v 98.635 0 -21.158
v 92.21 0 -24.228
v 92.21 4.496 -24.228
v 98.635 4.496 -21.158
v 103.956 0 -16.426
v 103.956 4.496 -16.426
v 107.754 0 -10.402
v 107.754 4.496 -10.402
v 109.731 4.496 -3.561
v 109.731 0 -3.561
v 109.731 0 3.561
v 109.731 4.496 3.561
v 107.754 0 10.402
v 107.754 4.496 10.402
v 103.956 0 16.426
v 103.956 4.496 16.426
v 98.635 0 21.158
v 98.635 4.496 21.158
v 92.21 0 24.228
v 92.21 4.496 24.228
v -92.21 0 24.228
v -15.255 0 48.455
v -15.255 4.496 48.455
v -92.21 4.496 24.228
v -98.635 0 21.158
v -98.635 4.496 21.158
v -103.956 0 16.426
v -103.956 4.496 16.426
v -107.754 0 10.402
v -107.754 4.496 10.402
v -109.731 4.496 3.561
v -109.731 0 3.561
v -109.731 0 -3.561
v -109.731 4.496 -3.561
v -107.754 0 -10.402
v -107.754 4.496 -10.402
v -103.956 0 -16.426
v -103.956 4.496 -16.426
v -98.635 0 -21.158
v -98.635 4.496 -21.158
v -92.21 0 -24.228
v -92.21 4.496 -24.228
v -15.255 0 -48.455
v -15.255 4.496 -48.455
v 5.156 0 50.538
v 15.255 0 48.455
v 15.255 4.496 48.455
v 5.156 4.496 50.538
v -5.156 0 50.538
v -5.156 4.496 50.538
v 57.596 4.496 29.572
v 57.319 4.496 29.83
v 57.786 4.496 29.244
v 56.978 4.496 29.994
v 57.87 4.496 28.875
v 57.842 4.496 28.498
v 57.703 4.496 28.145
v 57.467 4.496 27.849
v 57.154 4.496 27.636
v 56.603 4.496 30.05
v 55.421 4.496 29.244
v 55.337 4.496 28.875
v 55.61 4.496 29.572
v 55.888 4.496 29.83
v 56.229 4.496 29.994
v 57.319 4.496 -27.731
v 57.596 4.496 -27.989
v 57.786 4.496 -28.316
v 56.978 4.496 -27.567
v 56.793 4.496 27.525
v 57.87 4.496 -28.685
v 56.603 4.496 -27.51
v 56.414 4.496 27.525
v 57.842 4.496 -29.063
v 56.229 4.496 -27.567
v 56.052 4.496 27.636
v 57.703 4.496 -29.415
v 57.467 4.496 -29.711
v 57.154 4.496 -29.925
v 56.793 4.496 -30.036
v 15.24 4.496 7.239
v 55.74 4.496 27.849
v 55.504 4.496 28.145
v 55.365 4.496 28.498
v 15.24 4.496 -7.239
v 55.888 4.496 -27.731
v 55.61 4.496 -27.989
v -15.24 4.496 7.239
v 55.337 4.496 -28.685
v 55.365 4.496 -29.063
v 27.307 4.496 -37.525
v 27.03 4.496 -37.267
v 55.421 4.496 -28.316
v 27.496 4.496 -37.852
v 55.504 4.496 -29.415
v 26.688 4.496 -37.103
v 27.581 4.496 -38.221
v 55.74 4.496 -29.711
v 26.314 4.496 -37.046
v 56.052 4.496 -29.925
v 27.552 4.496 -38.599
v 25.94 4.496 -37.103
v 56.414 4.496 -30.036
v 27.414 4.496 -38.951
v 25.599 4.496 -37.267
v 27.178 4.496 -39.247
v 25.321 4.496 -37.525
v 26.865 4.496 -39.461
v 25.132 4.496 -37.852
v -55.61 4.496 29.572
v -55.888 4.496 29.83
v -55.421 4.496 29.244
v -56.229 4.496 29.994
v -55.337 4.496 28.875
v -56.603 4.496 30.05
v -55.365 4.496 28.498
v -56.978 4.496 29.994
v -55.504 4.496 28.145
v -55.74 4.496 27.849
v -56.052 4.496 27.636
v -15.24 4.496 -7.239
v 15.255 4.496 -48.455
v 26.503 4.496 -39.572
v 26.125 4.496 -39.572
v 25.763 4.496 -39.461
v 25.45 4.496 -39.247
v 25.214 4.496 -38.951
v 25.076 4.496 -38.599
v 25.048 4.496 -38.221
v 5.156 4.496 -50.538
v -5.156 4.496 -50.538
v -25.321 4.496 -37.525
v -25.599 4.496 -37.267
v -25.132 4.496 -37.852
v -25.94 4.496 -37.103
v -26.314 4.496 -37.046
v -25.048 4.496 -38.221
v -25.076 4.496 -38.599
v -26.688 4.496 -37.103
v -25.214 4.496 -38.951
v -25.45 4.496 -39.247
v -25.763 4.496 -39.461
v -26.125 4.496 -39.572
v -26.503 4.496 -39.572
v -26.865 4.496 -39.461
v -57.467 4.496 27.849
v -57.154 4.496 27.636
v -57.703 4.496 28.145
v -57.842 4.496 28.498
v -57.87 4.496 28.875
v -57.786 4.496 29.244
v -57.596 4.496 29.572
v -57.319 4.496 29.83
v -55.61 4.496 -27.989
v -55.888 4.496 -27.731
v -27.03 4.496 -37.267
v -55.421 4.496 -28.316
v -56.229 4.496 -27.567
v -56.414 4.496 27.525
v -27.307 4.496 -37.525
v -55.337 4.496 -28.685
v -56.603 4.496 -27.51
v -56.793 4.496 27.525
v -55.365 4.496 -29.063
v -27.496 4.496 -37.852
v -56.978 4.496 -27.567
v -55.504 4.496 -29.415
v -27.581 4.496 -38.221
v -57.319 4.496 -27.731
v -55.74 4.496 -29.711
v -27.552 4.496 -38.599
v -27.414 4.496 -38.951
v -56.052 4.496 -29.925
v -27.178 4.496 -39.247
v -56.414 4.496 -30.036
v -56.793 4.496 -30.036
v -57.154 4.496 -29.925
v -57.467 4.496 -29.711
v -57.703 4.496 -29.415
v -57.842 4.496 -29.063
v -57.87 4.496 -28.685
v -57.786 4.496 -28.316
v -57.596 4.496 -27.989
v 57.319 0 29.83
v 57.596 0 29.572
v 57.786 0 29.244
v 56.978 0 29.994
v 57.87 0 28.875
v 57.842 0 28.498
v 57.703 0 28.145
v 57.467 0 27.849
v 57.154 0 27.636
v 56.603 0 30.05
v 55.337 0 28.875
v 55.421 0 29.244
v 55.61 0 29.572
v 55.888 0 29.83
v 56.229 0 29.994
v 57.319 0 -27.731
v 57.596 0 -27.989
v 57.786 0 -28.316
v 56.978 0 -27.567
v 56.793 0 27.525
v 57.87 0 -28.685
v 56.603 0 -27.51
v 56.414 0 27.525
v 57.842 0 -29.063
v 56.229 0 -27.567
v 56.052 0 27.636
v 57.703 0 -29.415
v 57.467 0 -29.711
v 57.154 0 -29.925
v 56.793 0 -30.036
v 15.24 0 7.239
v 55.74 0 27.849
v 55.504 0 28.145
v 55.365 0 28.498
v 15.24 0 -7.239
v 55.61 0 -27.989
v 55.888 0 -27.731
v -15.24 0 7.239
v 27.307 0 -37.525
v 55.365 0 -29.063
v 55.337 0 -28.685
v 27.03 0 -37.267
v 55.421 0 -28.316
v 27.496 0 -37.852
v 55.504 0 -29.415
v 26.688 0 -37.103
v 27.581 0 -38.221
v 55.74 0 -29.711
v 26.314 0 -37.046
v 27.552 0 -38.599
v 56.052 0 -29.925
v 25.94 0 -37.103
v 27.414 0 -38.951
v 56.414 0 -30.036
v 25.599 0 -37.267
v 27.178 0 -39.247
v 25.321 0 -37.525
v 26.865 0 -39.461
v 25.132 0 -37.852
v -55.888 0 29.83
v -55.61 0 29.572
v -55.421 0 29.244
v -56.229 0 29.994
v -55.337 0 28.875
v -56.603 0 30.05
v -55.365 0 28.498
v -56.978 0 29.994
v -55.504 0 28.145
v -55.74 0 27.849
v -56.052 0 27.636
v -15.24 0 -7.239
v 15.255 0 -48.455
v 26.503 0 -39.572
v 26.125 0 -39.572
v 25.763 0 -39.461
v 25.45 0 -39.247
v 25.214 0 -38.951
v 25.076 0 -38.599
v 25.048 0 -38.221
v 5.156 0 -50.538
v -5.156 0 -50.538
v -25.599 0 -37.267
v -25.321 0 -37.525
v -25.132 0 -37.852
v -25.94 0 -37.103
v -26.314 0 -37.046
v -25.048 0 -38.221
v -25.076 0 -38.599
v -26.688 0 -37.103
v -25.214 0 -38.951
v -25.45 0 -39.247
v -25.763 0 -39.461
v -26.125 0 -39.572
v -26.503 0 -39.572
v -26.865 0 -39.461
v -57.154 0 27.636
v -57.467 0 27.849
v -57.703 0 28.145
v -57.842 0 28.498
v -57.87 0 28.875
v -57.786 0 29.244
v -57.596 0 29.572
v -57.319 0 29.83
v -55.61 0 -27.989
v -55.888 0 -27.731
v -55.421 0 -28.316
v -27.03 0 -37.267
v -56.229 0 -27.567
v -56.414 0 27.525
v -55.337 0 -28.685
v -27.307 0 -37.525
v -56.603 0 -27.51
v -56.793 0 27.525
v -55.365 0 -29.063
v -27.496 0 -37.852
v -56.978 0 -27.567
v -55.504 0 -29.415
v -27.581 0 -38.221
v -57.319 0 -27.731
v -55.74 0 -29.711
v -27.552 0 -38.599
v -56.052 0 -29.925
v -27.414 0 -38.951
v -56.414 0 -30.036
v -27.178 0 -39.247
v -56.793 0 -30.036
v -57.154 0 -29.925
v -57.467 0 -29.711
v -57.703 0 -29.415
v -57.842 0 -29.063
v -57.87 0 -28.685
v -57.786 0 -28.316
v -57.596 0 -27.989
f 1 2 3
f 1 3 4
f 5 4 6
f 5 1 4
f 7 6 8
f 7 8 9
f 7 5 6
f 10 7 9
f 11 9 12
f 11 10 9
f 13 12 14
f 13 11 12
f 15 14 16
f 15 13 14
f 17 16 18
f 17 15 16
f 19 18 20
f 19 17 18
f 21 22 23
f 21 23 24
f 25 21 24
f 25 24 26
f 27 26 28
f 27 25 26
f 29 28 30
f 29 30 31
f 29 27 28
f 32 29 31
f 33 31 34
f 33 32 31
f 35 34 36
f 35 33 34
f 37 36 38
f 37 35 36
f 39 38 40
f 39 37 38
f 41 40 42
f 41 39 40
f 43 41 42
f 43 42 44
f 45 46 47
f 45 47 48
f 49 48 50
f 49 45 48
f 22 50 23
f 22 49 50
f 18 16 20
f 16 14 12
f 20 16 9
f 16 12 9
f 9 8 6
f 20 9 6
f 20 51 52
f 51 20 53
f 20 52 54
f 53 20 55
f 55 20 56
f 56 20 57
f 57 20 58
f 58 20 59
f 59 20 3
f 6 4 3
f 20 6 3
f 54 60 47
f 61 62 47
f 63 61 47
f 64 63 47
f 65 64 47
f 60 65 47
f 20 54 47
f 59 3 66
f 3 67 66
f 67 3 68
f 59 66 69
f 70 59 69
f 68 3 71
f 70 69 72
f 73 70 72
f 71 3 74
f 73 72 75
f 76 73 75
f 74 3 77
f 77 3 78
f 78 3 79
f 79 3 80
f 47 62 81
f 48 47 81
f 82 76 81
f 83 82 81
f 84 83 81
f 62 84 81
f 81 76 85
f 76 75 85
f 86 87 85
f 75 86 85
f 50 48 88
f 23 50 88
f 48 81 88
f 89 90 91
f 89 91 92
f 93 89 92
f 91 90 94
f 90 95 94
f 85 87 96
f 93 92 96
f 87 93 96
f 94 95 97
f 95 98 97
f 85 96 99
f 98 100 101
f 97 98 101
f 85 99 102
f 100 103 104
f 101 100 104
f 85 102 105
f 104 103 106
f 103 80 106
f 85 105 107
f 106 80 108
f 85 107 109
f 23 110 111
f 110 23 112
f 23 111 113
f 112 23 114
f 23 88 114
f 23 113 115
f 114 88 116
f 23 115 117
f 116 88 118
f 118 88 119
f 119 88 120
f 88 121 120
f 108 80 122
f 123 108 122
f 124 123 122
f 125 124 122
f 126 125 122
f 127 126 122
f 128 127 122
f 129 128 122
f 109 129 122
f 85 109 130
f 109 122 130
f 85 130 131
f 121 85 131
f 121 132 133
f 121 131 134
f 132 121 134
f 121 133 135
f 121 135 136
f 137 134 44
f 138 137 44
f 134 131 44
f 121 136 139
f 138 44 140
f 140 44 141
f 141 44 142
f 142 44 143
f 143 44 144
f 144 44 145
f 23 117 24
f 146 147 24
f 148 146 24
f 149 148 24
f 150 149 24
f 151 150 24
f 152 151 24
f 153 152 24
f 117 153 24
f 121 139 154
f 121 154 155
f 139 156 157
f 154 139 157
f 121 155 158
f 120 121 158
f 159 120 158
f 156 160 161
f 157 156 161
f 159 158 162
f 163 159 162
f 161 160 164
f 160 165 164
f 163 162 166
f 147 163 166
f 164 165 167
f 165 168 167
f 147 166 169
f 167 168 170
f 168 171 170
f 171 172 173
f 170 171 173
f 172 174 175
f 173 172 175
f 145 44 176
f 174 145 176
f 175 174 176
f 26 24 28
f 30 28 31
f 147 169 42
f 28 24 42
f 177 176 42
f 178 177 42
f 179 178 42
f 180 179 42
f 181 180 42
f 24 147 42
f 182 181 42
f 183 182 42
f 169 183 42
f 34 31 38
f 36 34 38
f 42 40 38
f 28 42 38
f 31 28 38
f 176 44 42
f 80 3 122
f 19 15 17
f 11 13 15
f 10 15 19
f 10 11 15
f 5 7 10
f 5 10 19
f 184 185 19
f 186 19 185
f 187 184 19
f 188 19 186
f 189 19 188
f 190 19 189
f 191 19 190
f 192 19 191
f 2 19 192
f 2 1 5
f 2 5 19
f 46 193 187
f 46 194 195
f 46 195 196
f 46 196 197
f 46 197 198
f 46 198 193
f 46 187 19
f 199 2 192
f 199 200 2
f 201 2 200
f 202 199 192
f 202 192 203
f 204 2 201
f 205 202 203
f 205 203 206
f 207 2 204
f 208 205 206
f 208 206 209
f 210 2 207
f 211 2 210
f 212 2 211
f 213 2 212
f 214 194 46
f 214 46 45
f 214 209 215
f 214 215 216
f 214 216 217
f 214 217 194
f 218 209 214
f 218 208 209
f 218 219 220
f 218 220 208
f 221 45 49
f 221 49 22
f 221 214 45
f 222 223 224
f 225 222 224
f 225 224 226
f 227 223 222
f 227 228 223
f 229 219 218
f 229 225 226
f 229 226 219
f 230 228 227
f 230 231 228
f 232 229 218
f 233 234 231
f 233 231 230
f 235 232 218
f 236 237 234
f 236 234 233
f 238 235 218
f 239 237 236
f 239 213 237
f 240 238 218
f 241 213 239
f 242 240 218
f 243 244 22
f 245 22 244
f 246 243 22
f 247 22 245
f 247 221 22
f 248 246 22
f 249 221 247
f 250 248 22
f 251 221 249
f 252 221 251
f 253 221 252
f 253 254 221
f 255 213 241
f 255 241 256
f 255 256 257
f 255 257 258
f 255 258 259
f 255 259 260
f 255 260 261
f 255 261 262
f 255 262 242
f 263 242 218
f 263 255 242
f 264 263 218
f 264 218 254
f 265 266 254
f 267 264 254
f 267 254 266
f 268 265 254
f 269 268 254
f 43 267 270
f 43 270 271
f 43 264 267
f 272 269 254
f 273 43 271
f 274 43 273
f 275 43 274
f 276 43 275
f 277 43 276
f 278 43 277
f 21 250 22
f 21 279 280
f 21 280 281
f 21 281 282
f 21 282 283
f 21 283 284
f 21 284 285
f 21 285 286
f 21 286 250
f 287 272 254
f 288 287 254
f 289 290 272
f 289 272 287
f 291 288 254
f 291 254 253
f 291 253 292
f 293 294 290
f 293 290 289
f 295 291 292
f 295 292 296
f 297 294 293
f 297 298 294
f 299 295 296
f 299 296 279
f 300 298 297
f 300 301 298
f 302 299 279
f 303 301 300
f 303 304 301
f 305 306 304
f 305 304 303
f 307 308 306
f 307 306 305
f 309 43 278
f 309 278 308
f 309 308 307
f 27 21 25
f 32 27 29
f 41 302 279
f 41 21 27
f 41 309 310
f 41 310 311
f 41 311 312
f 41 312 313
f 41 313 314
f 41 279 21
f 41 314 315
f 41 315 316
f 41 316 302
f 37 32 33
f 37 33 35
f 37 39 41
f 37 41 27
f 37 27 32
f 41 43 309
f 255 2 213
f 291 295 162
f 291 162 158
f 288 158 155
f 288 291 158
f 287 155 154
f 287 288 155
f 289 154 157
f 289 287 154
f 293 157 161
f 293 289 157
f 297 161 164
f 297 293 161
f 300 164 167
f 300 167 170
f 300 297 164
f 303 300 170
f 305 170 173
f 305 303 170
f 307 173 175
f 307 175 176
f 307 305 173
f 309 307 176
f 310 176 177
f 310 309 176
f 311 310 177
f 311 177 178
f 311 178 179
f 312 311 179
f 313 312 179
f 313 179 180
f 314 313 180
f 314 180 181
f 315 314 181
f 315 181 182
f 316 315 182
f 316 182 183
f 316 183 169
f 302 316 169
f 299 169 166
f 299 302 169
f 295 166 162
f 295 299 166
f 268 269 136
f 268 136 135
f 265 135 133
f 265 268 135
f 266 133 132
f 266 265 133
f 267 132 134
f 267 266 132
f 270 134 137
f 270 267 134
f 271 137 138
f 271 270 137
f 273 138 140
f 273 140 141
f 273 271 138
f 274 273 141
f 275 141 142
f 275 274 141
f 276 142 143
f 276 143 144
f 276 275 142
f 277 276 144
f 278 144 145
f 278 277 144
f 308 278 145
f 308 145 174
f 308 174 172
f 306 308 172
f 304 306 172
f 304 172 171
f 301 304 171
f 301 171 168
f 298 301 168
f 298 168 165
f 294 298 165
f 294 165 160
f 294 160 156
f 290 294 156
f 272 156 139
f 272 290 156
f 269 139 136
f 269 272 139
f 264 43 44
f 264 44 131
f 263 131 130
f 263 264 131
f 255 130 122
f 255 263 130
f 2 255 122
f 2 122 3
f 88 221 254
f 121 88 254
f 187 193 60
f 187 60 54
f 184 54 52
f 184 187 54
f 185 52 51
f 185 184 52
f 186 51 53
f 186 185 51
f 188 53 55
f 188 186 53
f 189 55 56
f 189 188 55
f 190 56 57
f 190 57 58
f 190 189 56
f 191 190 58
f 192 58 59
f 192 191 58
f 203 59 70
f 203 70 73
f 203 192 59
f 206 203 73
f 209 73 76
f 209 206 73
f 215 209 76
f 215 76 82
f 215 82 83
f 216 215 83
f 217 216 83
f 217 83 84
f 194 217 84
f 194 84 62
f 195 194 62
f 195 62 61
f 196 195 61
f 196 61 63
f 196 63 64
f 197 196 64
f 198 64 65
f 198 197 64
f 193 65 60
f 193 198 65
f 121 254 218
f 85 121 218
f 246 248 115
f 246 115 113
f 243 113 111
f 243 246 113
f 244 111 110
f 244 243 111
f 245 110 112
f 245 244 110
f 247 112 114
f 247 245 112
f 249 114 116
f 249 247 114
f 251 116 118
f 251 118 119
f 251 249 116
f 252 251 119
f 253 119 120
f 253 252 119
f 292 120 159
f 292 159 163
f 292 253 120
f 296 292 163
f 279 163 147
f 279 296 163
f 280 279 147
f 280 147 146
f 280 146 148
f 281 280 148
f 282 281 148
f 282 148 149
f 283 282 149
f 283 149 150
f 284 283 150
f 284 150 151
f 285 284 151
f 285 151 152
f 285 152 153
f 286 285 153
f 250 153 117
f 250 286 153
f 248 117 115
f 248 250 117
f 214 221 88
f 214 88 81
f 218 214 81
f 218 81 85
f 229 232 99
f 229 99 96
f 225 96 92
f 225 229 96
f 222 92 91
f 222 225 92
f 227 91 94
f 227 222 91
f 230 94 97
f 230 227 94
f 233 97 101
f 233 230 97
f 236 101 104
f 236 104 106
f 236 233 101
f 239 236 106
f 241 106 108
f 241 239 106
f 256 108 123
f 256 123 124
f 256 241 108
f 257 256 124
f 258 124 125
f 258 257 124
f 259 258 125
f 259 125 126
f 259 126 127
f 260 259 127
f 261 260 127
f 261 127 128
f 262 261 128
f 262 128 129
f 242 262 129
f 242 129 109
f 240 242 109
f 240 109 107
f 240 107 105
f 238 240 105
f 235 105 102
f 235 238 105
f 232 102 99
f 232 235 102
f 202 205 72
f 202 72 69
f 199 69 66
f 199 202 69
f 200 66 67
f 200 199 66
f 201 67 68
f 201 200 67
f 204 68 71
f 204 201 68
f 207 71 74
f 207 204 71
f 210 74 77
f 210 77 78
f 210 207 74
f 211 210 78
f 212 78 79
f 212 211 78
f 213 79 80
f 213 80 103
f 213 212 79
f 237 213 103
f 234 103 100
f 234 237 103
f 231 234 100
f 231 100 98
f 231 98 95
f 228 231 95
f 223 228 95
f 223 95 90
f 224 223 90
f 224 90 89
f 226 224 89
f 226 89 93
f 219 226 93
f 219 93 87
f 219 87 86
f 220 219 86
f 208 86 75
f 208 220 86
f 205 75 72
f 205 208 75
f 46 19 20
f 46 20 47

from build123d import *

# Parameters (mm, degrees)
SKETCH1_R           = 1.27
SKETCH1_W           = 30.48
SKETCH1_H           = 14.478
BOSS_EXTRUDE1_DEPTH = 4.4958


with BuildPart() as part:
    # Sketch1 → Boss-Extrude1 (new body)
    with BuildSketch(Plane(origin=(0, 0, 0), x_dir=(1, 0, 0), z_dir=(0, 1, 0))):
        with BuildLine():
            Line((-92.209627628, 24.227655619), (-15.255255255, 48.455311237))
            ThreePointArc((-15.255255255, 48.455311237), (0, 50.8), (15.255255255, 48.455311237))
            Line((15.255255255, 48.455311237), (92.209627628, 24.227655619))
            ThreePointArc((92.209627628, 24.227655619), (109.982, 0), (92.209627628, -24.227655619))
            Line((92.209627628, -24.227655619), (15.255255255, -48.455311237))
            ThreePointArc((15.255255255, -48.455311237), (0, -50.8), (-15.255255255, -48.455311237))
            Line((-15.255255255, -48.455311237), (-92.209627628, -24.227655619))
            ThreePointArc((-92.209627628, -24.227655619), (-109.982, 0), (-92.209627628, 24.227655619))
        make_face()
        with Locations(Location((-56.603365496, 28.780358137, 0), (0, 0, 270))):
            Circle(SKETCH1_R, mode=Mode.SUBTRACT)
        with Locations(Location((-56.603365496, -28.780358137, 0), (0, 0, 270))):
            Circle(SKETCH1_R, mode=Mode.SUBTRACT)
        with Locations(Location((56.603365496, -28.780358137, 0), (0, 0, 270))):
            Circle(SKETCH1_R, mode=Mode.SUBTRACT)
        with Locations(Location((56.603365496, 28.780358137, 0), (0, 0, 270))):
            Circle(SKETCH1_R, mode=Mode.SUBTRACT)
        with Locations(Location((-26.314105966, 38.316369233, 0), (0, 0, 270))):
            Circle(SKETCH1_R, mode=Mode.SUBTRACT)
        with Locations(Location((26.314105966, 38.316369233, 0), (0, 0, 270))):
            Circle(SKETCH1_R, mode=Mode.SUBTRACT)
        Rectangle(SKETCH1_W, SKETCH1_H, mode=Mode.SUBTRACT)
    extrude(amount=BOSS_EXTRUDE1_DEPTH)


solid = part.part
